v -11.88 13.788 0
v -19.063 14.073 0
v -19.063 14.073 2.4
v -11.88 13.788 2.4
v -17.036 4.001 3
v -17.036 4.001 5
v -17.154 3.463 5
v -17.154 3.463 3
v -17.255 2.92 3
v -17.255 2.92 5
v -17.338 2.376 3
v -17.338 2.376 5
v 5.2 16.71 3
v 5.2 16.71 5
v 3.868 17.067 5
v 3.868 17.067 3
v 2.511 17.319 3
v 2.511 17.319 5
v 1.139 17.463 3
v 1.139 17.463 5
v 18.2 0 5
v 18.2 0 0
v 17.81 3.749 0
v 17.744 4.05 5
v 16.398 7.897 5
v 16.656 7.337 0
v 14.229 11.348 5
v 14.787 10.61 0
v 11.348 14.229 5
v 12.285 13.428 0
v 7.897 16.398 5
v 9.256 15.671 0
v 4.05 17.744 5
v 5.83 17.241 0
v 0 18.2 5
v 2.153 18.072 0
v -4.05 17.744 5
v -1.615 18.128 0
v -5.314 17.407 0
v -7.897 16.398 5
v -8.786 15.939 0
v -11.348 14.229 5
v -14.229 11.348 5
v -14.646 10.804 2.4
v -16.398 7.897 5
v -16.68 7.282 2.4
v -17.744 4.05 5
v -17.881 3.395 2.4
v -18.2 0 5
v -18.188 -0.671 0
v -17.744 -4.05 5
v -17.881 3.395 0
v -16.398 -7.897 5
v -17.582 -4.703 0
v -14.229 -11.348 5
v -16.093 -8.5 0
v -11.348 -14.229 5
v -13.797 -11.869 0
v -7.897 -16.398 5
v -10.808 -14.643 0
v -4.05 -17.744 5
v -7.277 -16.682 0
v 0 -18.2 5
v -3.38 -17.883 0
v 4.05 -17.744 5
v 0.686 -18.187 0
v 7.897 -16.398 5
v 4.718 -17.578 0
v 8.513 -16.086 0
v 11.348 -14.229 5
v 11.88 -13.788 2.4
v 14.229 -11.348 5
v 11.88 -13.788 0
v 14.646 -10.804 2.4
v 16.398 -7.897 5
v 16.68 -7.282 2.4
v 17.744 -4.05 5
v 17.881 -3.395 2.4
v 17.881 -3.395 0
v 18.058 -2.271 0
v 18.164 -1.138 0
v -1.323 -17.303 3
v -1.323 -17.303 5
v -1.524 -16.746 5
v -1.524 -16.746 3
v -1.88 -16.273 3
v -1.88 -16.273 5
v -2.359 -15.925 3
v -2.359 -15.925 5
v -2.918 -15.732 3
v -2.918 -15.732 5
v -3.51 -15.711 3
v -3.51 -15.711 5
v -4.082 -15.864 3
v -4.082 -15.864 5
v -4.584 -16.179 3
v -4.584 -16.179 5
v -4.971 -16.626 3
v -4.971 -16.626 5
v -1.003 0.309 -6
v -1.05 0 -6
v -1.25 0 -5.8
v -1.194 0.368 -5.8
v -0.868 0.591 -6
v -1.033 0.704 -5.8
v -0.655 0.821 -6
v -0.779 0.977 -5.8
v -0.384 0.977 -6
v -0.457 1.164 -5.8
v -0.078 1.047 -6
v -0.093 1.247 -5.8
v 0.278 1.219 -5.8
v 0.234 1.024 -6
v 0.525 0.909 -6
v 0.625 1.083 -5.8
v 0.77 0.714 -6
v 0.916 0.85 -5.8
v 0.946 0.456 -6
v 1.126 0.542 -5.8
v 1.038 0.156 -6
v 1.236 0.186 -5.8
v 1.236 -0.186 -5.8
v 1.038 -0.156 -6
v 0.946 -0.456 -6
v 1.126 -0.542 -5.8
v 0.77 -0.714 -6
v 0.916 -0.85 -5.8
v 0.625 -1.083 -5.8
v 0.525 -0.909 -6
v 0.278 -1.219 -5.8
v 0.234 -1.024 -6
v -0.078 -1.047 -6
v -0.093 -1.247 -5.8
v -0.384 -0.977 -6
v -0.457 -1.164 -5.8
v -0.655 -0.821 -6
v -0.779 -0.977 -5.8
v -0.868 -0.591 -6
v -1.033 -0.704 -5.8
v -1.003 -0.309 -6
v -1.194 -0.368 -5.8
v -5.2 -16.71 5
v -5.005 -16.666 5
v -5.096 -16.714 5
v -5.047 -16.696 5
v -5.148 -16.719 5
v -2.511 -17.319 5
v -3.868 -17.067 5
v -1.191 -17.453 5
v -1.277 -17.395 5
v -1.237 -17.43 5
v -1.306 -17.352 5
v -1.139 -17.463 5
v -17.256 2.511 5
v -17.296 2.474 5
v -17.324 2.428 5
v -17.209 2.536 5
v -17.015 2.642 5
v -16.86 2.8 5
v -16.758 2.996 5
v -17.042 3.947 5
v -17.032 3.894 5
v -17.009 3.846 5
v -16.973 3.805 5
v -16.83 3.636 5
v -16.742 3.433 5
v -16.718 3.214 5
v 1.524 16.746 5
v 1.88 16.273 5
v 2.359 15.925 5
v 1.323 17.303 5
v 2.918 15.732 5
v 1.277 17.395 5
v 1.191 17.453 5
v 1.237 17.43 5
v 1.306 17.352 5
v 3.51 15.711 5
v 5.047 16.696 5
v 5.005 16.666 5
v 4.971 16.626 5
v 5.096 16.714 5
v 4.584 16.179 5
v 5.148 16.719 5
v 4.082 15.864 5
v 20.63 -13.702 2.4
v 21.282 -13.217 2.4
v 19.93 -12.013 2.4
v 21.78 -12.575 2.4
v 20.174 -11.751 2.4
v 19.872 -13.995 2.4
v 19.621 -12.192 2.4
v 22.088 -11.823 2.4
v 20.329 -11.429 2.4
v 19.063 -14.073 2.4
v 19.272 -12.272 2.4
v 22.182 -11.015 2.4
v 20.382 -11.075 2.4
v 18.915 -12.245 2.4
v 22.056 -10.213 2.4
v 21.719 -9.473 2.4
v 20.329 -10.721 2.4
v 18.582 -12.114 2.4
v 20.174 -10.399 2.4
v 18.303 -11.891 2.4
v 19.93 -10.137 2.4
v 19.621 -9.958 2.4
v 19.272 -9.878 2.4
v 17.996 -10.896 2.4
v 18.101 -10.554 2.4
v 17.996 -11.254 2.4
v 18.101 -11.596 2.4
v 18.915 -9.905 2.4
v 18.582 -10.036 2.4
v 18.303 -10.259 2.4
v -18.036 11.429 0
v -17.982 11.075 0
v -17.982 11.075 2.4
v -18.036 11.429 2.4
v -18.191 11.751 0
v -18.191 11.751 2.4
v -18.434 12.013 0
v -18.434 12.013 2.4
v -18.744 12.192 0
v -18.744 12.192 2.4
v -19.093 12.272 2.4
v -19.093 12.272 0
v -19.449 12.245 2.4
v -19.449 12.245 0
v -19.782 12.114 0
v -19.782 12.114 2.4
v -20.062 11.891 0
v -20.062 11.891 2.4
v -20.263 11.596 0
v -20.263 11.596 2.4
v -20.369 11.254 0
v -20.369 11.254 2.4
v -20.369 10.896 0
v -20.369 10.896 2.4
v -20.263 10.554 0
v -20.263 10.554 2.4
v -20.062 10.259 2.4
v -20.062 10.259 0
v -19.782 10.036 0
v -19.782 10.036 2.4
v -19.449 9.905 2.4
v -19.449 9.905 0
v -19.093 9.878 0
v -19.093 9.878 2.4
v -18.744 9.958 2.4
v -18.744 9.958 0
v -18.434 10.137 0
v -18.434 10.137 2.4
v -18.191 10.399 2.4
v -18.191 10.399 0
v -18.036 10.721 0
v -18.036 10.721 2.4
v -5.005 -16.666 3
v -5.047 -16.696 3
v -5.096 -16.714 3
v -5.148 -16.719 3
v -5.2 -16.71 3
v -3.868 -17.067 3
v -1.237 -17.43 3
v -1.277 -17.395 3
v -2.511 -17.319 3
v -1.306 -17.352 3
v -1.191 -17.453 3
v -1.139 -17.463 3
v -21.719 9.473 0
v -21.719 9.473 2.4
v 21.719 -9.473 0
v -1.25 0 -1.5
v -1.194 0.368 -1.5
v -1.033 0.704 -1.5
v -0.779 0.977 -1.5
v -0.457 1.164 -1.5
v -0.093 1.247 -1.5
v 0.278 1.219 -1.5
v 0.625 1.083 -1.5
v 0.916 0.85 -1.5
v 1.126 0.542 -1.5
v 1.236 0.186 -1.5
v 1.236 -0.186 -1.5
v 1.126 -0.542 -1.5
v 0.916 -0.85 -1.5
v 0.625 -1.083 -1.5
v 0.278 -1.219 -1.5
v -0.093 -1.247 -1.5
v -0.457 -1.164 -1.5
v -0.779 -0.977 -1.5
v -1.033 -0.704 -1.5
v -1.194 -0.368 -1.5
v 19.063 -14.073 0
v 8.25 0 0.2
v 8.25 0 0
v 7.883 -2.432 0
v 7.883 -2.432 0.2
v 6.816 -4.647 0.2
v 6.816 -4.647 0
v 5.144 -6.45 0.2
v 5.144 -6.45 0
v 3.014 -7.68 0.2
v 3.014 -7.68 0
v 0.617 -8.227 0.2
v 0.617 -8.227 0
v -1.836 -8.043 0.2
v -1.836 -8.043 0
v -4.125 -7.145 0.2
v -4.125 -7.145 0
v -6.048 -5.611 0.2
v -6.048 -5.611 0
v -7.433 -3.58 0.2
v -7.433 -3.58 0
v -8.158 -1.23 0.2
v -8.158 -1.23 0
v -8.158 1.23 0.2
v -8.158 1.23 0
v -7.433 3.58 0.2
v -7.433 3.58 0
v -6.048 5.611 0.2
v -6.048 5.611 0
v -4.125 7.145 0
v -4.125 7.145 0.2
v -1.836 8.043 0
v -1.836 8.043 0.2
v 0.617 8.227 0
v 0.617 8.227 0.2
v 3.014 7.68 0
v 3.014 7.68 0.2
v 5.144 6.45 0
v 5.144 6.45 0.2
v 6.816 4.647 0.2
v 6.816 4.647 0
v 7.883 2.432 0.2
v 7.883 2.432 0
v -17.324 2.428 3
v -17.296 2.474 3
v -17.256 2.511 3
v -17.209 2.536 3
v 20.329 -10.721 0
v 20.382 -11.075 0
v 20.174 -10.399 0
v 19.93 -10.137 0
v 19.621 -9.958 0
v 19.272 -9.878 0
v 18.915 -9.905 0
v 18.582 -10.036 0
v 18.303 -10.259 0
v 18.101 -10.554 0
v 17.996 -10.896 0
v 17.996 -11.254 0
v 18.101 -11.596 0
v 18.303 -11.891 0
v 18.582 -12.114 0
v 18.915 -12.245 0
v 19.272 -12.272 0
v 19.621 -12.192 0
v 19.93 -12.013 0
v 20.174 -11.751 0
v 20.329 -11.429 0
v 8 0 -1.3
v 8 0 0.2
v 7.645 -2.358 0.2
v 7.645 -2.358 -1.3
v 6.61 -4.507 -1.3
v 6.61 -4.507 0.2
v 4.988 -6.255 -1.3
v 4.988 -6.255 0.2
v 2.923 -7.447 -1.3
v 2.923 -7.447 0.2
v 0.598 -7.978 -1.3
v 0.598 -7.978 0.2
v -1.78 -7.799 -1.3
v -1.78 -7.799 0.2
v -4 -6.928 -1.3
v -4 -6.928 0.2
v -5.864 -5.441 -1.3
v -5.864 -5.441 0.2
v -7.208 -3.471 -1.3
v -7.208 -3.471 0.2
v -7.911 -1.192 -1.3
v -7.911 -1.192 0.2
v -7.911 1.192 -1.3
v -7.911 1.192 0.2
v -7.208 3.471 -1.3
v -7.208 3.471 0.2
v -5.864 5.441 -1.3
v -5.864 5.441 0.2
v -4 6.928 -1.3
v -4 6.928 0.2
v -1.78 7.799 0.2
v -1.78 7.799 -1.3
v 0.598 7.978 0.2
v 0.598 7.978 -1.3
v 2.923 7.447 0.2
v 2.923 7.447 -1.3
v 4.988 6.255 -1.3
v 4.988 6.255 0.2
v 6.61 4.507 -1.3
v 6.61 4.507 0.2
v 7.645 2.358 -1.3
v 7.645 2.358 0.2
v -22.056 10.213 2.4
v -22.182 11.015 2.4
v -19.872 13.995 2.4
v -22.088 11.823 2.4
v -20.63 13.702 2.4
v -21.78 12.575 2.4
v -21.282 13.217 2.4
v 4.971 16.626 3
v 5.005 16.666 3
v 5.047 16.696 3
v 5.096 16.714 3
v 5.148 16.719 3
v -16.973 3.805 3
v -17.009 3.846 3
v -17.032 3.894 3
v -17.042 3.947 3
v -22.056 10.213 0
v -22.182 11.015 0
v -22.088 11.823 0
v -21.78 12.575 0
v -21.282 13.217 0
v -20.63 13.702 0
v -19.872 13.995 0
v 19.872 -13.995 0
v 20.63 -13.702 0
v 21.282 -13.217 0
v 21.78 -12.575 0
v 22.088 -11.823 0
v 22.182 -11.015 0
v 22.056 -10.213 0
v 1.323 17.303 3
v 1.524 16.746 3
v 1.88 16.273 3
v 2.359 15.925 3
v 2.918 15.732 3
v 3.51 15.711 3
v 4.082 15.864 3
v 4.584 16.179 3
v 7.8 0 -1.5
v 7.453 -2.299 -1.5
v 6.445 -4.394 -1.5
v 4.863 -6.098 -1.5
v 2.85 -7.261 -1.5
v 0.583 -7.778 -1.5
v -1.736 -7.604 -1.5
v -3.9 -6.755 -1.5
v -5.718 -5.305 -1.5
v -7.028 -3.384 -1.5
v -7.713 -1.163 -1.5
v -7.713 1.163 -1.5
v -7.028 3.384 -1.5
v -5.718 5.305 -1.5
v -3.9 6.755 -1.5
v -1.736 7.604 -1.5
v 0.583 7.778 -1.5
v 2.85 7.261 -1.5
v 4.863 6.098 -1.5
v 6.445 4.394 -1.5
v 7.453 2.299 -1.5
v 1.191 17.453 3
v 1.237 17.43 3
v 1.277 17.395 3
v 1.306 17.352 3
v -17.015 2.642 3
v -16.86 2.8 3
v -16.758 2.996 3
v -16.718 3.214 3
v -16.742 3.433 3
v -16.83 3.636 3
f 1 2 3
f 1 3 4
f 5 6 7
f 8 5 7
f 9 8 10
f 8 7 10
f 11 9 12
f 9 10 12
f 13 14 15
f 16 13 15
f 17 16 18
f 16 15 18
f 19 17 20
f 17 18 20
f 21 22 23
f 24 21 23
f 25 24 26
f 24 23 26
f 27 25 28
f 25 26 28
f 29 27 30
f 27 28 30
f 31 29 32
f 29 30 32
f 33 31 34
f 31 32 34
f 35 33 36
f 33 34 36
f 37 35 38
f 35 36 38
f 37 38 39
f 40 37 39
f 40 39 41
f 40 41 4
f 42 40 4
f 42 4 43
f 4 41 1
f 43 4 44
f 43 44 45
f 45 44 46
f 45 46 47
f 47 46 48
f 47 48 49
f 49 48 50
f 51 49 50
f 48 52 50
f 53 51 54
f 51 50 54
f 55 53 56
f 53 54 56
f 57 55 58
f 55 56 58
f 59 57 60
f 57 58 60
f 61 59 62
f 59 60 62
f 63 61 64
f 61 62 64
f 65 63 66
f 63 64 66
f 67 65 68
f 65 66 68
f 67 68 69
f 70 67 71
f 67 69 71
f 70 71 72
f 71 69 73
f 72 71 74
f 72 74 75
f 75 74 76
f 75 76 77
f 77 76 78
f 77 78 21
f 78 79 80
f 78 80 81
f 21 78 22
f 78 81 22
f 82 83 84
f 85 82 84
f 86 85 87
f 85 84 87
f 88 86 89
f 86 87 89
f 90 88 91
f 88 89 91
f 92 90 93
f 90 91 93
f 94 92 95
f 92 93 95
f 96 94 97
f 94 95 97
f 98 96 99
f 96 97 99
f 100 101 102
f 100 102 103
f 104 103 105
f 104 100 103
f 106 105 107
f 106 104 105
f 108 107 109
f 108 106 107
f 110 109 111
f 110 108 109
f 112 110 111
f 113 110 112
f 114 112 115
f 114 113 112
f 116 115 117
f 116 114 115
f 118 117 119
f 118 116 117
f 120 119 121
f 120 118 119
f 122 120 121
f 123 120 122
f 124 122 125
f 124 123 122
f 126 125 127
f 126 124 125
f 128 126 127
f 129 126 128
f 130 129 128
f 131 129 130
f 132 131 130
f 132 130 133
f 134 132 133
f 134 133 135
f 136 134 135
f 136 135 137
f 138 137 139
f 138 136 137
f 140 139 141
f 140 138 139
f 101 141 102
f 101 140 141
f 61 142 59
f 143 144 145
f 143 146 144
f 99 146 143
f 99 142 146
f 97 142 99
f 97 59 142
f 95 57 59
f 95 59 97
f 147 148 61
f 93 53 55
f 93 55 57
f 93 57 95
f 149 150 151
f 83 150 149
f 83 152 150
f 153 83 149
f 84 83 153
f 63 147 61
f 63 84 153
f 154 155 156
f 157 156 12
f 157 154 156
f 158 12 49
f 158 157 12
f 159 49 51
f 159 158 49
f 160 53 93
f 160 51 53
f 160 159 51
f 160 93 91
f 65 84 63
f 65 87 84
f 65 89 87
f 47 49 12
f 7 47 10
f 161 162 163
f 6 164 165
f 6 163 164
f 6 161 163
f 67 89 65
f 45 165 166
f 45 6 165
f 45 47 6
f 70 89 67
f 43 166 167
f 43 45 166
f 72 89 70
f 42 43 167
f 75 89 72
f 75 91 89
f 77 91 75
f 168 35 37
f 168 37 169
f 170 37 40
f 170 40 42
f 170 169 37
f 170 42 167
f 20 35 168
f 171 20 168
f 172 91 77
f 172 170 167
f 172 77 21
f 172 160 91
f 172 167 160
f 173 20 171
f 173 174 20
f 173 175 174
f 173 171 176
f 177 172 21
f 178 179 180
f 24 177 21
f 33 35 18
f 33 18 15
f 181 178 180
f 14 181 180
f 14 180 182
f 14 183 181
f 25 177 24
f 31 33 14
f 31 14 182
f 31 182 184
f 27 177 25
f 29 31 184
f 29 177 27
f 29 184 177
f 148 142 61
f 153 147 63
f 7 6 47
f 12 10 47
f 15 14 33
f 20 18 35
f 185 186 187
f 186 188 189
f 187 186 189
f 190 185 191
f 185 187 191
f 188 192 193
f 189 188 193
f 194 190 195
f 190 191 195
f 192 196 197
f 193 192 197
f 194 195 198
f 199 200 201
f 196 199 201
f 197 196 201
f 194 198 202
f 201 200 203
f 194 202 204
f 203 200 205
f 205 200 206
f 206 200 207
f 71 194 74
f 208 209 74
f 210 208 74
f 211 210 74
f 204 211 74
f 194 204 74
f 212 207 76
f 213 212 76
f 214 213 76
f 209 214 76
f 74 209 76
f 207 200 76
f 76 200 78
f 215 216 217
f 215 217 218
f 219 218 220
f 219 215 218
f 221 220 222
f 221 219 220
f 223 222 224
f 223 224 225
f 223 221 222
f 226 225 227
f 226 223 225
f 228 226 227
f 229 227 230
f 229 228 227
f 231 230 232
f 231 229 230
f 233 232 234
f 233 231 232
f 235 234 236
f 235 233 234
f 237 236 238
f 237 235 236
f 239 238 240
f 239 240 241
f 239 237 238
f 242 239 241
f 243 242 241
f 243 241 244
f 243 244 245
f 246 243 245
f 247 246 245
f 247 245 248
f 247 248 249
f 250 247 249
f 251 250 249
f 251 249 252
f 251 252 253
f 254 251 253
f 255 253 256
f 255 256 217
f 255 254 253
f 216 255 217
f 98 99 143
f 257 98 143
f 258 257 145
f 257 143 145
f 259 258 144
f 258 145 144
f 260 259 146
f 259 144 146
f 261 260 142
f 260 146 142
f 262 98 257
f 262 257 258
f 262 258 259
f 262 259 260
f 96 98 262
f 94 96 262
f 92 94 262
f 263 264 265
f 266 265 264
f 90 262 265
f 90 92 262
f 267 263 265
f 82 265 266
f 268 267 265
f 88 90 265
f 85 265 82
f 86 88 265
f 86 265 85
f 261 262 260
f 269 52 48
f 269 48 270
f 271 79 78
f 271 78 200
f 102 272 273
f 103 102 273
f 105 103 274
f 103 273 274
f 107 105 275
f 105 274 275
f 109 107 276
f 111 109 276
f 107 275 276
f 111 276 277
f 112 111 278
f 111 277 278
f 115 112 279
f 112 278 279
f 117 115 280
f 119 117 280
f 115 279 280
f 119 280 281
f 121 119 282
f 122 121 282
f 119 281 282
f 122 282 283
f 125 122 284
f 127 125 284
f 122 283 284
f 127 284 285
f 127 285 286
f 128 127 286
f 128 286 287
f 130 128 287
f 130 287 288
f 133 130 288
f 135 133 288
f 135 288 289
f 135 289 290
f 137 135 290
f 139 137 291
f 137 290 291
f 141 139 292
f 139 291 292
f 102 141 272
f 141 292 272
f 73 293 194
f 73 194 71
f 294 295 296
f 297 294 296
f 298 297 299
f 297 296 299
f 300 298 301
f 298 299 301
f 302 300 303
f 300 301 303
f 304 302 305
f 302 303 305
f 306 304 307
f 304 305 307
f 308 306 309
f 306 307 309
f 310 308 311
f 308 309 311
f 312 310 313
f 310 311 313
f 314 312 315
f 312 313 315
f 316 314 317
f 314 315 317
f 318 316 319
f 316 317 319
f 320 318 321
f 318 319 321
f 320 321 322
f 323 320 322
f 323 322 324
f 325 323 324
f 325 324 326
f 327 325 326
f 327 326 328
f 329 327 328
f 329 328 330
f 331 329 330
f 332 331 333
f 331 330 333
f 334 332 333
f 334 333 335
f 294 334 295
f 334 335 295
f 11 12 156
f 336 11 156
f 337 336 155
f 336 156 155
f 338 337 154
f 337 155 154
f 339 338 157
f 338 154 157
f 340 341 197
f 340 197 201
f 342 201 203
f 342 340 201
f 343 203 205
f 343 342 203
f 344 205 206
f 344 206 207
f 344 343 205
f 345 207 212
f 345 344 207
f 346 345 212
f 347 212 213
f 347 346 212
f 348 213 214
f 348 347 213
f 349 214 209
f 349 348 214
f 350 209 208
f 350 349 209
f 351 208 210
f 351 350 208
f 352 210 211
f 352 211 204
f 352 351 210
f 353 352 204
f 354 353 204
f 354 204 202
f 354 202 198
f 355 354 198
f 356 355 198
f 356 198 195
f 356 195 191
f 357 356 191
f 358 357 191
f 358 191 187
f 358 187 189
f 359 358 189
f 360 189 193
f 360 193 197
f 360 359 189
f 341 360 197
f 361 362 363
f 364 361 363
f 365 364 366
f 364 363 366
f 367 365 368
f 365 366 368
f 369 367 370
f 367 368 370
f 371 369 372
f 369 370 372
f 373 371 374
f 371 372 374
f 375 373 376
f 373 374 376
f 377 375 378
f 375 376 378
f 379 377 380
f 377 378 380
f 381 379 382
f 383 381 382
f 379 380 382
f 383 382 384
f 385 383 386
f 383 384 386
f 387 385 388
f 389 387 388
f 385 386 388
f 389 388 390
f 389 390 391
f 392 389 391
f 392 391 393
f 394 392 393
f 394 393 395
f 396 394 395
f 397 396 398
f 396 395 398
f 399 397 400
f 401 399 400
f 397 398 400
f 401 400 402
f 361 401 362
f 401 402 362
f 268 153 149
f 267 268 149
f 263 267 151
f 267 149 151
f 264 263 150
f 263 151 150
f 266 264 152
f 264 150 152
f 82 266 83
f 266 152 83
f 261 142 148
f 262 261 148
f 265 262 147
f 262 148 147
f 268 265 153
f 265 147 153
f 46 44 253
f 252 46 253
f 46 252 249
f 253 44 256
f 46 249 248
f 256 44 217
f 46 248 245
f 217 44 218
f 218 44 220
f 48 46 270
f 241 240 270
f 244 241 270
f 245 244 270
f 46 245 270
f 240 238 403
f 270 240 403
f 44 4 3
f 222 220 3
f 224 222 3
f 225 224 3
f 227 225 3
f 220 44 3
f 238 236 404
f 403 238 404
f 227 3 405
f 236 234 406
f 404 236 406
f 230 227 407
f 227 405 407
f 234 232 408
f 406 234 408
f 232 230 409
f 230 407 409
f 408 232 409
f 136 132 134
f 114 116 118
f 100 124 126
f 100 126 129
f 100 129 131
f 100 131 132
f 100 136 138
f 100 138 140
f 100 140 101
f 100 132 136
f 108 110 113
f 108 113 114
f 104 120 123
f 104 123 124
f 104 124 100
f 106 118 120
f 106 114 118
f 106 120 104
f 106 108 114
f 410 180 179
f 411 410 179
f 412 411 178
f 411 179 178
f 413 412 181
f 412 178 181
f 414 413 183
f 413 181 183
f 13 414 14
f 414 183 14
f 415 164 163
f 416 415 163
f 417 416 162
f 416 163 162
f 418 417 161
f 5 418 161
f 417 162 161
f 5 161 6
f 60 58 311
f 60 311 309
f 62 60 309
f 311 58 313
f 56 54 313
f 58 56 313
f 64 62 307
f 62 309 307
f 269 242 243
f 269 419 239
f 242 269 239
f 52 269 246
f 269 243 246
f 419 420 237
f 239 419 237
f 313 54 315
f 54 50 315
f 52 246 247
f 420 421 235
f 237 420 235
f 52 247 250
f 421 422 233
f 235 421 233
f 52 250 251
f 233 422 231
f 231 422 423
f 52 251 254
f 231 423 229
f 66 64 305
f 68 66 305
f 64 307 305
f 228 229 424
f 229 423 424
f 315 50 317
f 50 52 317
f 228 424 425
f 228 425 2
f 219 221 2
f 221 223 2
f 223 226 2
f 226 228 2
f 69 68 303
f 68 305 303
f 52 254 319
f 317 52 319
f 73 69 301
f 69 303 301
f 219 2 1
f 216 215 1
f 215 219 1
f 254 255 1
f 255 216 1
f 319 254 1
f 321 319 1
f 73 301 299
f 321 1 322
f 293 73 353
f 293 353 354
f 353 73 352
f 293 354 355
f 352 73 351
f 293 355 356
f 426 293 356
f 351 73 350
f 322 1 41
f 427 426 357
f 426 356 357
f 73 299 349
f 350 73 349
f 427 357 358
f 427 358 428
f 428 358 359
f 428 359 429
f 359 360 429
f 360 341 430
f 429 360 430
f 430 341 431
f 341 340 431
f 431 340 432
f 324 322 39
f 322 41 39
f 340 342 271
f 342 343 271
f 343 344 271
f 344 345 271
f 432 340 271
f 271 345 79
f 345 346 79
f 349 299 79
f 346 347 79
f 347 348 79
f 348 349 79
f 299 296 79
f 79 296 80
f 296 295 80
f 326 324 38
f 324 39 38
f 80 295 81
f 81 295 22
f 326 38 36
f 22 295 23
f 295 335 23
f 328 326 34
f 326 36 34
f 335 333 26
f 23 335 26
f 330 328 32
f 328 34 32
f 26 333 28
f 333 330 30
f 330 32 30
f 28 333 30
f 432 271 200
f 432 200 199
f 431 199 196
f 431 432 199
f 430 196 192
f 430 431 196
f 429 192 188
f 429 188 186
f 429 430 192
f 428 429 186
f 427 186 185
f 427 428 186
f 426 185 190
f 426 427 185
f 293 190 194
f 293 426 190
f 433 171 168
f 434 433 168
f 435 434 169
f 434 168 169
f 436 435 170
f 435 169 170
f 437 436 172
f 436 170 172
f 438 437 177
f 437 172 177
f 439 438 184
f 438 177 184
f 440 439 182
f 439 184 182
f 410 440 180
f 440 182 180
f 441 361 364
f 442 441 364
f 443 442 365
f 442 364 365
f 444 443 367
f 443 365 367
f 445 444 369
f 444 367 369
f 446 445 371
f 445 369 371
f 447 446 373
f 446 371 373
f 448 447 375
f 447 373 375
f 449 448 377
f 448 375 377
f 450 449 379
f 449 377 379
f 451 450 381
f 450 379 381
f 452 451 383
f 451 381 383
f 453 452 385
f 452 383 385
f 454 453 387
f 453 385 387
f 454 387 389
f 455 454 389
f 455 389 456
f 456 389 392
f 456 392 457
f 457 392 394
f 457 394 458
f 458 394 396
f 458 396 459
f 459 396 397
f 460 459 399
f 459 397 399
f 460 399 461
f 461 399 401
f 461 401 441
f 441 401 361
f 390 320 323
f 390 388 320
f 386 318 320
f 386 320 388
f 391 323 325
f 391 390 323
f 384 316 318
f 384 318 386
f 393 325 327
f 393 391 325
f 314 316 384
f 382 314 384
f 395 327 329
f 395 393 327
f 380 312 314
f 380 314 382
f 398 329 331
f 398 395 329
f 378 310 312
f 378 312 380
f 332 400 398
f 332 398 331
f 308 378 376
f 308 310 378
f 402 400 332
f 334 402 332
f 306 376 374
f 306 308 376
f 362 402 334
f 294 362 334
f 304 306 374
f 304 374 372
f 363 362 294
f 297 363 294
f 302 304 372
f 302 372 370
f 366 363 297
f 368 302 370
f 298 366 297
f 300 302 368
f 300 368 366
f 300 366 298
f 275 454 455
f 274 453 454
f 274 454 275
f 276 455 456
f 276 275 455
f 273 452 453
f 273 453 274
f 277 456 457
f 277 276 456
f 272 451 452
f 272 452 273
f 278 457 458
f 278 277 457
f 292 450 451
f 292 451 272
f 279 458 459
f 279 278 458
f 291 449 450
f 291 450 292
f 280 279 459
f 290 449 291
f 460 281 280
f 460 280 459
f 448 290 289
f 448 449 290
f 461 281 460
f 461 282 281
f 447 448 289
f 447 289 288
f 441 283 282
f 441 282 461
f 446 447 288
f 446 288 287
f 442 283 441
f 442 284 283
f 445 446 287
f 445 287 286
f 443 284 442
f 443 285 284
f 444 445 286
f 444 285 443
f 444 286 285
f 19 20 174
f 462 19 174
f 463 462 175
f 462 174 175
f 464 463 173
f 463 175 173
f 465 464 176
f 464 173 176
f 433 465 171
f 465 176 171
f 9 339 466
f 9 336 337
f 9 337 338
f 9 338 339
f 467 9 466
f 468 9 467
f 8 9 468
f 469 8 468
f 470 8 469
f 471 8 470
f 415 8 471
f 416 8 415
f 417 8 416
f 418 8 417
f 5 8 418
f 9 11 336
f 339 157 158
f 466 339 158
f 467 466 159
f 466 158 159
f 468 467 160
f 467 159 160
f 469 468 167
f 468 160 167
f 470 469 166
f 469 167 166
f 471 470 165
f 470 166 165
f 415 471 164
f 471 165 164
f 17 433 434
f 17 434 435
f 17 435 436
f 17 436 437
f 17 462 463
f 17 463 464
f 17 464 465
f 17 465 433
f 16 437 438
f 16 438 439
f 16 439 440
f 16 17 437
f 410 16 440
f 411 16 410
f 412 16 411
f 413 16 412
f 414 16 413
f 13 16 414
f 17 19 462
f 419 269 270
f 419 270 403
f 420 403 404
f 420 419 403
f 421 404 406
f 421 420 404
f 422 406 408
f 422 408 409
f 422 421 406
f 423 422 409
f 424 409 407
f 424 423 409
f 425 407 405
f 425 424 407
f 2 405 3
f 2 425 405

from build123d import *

# Parameters (mm, degrees)
SKETCH4_R           = 18.2
BOSS_EXTRUDE3_DEPTH = 5
CUT_EXTRUDE2_DEPTH  = 2
SKETCH6_R           = 1.2
BOSS_EXTRUDE4_DEPTH = 2.4
SKETCH1_R           = 8.25
CUT_EXTRUDE1_DEPTH  = 0.2
SKETCH2_R           = 8
BOSS_EXTRUDE1_DEPTH = 1.7
SKETCH3_R           = 1.25
BOSS_EXTRUDE2_DEPTH = 4.5
CHAMFER1_SIZE       = 0.2
CHAMFER2_SIZE       = 0.2


with BuildPart() as part:
    # Sketch4 → Boss-Extrude3 (new body)
    with BuildSketch(Plane.XY):
        Circle(SKETCH4_R)
    extrude(amount=BOSS_EXTRUDE3_DEPTH)

    # Sketch5 → Cut-Extrude2 (cut)
    with BuildSketch(Plane.XY.offset(5)):
        with BuildLine():
            ThreePointArc((1.322526628, 17.302811533), (2.918295178, 15.731610002), (4.971429117, 16.625921213))
            ThreePointArc((4.971429117, 16.625921213), (5.071370491, 16.706466919), (5.199688837, 16.709674922))
            ThreePointArc((5.199688837, 16.709674922), (3.191885351, 17.20644844), (1.139493871, 17.462862128))
            ThreePointArc((1.139493871, 17.462862128), (1.258123981, 17.413843908), (1.322526628, 17.302811533))
        make_face()
        with BuildLine():
            ThreePointArc((-17.208763457, 2.536145077), (-16.729701345, 3.103446294), (-16.97341649, 3.804826439))
            ThreePointArc((-16.97341649, 3.804826439), (-17.032179911, 3.894218363), (-17.036464522, 4.001109419))
            ThreePointArc((-17.036464522, 4.001109419), (-17.20644844, 3.191885351), (-17.338016995, 2.375535034))
            ThreePointArc((-17.338016995, 2.375535034), (-17.295679076, 2.473777369), (-17.208763457, 2.536145077))
        make_face()
        with BuildLine():
            ThreePointArc((-5.199688837, -16.709674922), (-3.191885351, -17.20644844), (-1.139493871, -17.462862128))
            ThreePointArc((-1.139493871, -17.462862128), (-1.258123981, -17.413843908), (-1.322526628, -17.302811533))
            ThreePointArc((-1.322526628, -17.302811533), (-2.918295178, -15.731610002), (-4.971429117, -16.625921213))
            ThreePointArc((-4.971429117, -16.625921213), (-5.071370491, -16.706466919), (-5.199688837, -16.709674922))
        make_face()
    extrude(amount=-CUT_EXTRUDE2_DEPTH, mode=Mode.SUBTRACT)

    # Sketch6 → Boss-Extrude4 (add)
    # profile 1 of 2: a face of its own
    with BuildSketch(Plane.XY):
        with BuildLine():
            Line((-19.06335062, 14.072551336), (-11.880431968, 13.787506527))
            ThreePointArc((-11.880431968, 13.787506527), (-15.761662349, 9.1), (-17.880546892, 3.395002629))
            Line((-17.880546892, 3.395002629), (-21.718862263, 9.47307025))
            ThreePointArc((-21.718862263, 9.47307025), (-21.78038431, 12.574910744), (-19.06335062, 14.072551336))
        make_face()
        with Locations((-19.182308099, 11.074910744)):
            Circle(SKETCH6_R, mode=Mode.SUBTRACT)
    # profile 2 of 2: a face of its own
    with BuildSketch(Plane.XY):
        with BuildLine():
            Line((17.880546892, -3.395002629), (21.718862263, -9.47307025))
            ThreePointArc((21.718862263, -9.47307025), (21.78038431, -12.574910744), (19.06335062, -14.072551336))
            Line((19.06335062, -14.072551336), (11.880431968, -13.787506527))
            ThreePointArc((11.880431968, -13.787506527), (15.761662349, -9.1), (17.880546892, -3.395002629))
        make_face()
        with Locations((19.182308099, -11.074910744)):
            Circle(SKETCH6_R, mode=Mode.SUBTRACT)
    extrude(amount=BOSS_EXTRUDE4_DEPTH)

    # Sketch1 → Cut-Extrude1 (cut)
    with BuildSketch(Plane(origin=(0, 0, 0), x_dir=(-1, 0, 0), z_dir=(0, 0, -1))):
        with Locations(Location((0, 0, 0), (0, 0, 180))):
            Circle(SKETCH1_R)
    extrude(amount=-CUT_EXTRUDE1_DEPTH, mode=Mode.SUBTRACT)

    # Sketch2 → Boss-Extrude1 (add)
    with BuildSketch(Plane(origin=(0, 0, 0.2), x_dir=(-1, 0, 0), z_dir=(0, 0, -1))):
        with Locations(Location((0, 0, 0), (0, 0, 180))):
            Circle(SKETCH2_R)
    extrude(amount=BOSS_EXTRUDE1_DEPTH)

    # Sketch3 → Boss-Extrude2 (add)
    with BuildSketch(Plane(origin=(0, 0, -1.5), x_dir=(-1, 0, 0), z_dir=(0, 0, -1))):
        Circle(SKETCH3_R)
    extrude(amount=BOSS_EXTRUDE2_DEPTH)

    # Chamfer1
    chamfer1_edges = [part.edges().sort_by_distance(p)[0] for p in [
        (1.25, 0, -6),
    ]]
    chamfer(chamfer1_edges, length=CHAMFER1_SIZE)

    # Chamfer2
    chamfer2_edges = [part.edges().sort_by_distance(p)[0] for p in [
        (-8, 0, -1.5),
    ]]
    chamfer(chamfer2_edges, length=CHAMFER2_SIZE)


solid = part.part
